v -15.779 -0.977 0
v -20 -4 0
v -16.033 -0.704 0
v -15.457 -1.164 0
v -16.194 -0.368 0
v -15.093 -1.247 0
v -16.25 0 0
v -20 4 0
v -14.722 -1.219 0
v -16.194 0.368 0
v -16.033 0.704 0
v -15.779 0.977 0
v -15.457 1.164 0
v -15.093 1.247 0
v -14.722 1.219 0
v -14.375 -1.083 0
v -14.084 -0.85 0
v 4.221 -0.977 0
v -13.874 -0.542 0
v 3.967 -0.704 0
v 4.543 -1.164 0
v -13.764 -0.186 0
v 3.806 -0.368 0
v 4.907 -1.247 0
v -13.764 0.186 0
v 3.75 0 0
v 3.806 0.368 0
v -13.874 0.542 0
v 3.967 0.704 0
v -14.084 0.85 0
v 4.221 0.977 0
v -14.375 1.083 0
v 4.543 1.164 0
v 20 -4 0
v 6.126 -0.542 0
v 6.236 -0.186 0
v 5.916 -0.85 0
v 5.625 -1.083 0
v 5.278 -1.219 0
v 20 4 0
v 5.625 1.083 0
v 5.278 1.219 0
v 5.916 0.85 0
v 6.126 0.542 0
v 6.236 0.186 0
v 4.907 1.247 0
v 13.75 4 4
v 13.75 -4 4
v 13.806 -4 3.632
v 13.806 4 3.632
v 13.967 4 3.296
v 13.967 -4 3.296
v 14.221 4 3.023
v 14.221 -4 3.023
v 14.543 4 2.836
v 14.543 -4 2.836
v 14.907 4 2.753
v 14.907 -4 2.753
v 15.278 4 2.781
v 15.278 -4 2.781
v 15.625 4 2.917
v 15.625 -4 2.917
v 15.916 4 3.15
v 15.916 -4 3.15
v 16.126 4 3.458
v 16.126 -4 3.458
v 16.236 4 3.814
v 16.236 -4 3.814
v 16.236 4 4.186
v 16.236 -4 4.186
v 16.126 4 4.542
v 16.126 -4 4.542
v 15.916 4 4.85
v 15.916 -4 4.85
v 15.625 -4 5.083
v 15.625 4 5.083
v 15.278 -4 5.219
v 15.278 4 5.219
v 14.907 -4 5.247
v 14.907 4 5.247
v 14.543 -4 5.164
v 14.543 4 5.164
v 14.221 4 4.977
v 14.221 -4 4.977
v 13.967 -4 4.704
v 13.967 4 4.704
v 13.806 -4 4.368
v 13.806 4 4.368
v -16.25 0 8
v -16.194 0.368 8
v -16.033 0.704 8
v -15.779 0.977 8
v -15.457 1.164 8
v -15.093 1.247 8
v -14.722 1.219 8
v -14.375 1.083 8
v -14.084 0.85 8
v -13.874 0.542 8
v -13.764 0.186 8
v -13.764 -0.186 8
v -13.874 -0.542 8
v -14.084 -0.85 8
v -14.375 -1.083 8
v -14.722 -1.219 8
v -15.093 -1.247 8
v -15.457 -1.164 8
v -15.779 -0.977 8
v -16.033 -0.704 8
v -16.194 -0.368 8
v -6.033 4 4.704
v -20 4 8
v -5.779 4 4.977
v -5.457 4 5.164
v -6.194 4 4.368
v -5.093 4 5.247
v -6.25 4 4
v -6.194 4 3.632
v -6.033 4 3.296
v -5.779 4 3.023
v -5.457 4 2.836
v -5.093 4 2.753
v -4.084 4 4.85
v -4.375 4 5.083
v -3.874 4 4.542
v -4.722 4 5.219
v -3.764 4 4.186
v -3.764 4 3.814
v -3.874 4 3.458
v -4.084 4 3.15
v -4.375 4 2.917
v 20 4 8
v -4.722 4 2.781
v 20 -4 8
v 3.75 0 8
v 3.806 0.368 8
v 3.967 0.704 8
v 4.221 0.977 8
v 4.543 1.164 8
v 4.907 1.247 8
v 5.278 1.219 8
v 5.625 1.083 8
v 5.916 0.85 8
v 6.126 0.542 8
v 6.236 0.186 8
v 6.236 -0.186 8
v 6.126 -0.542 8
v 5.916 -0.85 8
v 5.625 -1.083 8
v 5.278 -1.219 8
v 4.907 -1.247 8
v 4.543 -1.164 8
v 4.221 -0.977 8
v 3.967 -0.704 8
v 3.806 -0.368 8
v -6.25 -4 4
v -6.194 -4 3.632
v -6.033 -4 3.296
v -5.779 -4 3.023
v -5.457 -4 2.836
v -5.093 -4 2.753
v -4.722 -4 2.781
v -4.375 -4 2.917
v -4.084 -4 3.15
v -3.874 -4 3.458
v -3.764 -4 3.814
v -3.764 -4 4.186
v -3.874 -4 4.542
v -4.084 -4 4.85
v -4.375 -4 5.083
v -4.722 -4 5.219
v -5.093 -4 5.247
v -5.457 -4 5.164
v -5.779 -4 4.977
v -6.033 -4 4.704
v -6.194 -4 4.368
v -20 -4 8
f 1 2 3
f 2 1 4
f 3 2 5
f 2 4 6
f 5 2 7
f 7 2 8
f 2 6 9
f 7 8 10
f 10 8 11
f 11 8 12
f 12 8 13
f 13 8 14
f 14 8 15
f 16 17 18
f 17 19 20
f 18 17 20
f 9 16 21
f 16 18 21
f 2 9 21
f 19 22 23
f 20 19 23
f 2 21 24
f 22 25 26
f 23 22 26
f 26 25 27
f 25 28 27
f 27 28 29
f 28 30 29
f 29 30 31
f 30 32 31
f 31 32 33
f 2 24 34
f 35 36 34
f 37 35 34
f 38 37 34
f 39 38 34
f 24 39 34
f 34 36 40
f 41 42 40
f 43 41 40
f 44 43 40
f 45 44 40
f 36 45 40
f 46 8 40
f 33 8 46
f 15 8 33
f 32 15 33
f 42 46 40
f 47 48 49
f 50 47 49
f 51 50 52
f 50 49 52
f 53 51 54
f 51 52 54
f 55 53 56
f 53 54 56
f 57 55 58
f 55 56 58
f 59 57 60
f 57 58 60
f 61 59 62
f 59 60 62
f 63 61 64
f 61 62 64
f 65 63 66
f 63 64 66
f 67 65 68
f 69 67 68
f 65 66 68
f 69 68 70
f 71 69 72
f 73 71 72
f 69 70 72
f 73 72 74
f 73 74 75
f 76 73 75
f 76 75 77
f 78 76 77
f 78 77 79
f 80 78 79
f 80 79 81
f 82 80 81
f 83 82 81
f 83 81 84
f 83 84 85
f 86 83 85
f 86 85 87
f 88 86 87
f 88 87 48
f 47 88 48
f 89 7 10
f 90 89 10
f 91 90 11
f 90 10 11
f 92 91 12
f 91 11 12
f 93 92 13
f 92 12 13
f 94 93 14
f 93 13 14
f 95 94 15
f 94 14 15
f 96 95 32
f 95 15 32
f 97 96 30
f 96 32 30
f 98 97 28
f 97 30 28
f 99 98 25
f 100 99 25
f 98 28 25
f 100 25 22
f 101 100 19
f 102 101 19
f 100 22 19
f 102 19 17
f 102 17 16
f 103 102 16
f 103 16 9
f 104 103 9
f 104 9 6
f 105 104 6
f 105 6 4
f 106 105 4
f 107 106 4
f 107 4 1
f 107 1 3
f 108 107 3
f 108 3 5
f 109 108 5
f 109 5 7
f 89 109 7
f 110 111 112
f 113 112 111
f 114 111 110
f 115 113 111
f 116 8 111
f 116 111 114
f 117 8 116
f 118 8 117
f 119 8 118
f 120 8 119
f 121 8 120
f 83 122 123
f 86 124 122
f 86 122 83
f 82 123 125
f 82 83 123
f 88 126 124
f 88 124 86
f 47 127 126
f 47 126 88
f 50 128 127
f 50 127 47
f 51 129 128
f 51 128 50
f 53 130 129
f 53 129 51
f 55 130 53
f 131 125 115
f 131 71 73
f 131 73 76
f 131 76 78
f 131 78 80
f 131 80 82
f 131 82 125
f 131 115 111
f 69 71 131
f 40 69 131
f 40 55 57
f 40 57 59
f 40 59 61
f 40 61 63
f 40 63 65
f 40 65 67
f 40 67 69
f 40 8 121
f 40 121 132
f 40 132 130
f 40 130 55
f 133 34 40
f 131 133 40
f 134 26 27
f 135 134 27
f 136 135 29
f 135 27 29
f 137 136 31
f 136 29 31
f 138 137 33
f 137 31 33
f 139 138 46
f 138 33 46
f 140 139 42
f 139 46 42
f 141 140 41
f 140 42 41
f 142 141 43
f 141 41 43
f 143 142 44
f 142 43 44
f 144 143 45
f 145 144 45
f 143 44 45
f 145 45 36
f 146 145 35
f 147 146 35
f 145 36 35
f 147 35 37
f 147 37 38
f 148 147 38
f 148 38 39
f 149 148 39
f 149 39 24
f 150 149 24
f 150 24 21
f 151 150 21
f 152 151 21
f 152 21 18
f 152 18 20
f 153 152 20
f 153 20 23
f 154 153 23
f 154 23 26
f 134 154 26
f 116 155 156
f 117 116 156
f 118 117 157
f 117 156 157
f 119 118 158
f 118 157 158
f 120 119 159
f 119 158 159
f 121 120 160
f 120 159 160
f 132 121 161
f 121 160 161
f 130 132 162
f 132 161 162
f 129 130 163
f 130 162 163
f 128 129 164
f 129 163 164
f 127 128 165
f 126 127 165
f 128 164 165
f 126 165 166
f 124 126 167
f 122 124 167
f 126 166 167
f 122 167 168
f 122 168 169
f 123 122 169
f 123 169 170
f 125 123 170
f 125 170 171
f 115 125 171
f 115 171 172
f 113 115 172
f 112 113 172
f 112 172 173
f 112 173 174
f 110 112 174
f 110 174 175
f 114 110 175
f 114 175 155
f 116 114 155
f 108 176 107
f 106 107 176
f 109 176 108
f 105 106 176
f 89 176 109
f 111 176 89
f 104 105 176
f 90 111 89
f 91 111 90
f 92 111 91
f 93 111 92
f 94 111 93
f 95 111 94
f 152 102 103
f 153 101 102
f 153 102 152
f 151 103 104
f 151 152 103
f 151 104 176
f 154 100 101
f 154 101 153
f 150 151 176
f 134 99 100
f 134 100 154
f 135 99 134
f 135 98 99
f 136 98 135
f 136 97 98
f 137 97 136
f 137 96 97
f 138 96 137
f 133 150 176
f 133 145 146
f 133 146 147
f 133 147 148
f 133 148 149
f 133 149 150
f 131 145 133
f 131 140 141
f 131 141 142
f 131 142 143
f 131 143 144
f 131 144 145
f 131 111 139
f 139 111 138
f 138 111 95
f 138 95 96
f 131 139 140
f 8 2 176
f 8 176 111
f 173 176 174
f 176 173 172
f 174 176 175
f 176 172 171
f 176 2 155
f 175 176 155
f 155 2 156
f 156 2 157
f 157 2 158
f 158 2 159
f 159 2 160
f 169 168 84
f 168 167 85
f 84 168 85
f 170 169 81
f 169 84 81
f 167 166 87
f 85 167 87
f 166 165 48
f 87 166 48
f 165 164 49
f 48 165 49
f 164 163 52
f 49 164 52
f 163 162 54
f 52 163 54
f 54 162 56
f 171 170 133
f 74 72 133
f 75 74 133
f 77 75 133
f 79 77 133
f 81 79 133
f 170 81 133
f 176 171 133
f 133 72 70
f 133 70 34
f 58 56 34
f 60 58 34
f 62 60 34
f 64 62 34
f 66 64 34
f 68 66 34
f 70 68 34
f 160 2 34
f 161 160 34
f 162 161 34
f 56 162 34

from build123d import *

# Parameters (mm, degrees)
SKETCH_1_W                   = 40
SKETCH_1_H                   = 8
EXTRUDE_1_DEPTH              = 8
HOLE_WIZARD_M3_1_D           = 2.5
HOLE_WIZARD_M3_1_ON_FACE_2_D = 2.5


with BuildPart() as part:
    # 草图1 → 凸台-拉伸1 (new body)
    with BuildSketch(Plane.XY):
        Rectangle(SKETCH_1_W, SKETCH_1_H)
    extrude(amount=EXTRUDE_1_DEPTH)

    # M3 螺纹孔的螺纹孔钻头1 (through all)
    with Locations(Plane(origin=(-5, 4, 4), x_dir=(1, 0, 0), z_dir=(0, 1, 0))):
        with Locations((0, 0), (20, 0)):
            Hole(HOLE_WIZARD_M3_1_D / 2)

    # M3 螺纹孔的螺纹孔钻头1 on face 2 (through all)
    with Locations(Plane(origin=(5, 0, 8), x_dir=(1, 0, 0), z_dir=(0, 0, 1))):
        with Locations((0, 0), (-20, 0)):
            Hole(HOLE_WIZARD_M3_1_ON_FACE_2_D / 2)


solid = part.part
